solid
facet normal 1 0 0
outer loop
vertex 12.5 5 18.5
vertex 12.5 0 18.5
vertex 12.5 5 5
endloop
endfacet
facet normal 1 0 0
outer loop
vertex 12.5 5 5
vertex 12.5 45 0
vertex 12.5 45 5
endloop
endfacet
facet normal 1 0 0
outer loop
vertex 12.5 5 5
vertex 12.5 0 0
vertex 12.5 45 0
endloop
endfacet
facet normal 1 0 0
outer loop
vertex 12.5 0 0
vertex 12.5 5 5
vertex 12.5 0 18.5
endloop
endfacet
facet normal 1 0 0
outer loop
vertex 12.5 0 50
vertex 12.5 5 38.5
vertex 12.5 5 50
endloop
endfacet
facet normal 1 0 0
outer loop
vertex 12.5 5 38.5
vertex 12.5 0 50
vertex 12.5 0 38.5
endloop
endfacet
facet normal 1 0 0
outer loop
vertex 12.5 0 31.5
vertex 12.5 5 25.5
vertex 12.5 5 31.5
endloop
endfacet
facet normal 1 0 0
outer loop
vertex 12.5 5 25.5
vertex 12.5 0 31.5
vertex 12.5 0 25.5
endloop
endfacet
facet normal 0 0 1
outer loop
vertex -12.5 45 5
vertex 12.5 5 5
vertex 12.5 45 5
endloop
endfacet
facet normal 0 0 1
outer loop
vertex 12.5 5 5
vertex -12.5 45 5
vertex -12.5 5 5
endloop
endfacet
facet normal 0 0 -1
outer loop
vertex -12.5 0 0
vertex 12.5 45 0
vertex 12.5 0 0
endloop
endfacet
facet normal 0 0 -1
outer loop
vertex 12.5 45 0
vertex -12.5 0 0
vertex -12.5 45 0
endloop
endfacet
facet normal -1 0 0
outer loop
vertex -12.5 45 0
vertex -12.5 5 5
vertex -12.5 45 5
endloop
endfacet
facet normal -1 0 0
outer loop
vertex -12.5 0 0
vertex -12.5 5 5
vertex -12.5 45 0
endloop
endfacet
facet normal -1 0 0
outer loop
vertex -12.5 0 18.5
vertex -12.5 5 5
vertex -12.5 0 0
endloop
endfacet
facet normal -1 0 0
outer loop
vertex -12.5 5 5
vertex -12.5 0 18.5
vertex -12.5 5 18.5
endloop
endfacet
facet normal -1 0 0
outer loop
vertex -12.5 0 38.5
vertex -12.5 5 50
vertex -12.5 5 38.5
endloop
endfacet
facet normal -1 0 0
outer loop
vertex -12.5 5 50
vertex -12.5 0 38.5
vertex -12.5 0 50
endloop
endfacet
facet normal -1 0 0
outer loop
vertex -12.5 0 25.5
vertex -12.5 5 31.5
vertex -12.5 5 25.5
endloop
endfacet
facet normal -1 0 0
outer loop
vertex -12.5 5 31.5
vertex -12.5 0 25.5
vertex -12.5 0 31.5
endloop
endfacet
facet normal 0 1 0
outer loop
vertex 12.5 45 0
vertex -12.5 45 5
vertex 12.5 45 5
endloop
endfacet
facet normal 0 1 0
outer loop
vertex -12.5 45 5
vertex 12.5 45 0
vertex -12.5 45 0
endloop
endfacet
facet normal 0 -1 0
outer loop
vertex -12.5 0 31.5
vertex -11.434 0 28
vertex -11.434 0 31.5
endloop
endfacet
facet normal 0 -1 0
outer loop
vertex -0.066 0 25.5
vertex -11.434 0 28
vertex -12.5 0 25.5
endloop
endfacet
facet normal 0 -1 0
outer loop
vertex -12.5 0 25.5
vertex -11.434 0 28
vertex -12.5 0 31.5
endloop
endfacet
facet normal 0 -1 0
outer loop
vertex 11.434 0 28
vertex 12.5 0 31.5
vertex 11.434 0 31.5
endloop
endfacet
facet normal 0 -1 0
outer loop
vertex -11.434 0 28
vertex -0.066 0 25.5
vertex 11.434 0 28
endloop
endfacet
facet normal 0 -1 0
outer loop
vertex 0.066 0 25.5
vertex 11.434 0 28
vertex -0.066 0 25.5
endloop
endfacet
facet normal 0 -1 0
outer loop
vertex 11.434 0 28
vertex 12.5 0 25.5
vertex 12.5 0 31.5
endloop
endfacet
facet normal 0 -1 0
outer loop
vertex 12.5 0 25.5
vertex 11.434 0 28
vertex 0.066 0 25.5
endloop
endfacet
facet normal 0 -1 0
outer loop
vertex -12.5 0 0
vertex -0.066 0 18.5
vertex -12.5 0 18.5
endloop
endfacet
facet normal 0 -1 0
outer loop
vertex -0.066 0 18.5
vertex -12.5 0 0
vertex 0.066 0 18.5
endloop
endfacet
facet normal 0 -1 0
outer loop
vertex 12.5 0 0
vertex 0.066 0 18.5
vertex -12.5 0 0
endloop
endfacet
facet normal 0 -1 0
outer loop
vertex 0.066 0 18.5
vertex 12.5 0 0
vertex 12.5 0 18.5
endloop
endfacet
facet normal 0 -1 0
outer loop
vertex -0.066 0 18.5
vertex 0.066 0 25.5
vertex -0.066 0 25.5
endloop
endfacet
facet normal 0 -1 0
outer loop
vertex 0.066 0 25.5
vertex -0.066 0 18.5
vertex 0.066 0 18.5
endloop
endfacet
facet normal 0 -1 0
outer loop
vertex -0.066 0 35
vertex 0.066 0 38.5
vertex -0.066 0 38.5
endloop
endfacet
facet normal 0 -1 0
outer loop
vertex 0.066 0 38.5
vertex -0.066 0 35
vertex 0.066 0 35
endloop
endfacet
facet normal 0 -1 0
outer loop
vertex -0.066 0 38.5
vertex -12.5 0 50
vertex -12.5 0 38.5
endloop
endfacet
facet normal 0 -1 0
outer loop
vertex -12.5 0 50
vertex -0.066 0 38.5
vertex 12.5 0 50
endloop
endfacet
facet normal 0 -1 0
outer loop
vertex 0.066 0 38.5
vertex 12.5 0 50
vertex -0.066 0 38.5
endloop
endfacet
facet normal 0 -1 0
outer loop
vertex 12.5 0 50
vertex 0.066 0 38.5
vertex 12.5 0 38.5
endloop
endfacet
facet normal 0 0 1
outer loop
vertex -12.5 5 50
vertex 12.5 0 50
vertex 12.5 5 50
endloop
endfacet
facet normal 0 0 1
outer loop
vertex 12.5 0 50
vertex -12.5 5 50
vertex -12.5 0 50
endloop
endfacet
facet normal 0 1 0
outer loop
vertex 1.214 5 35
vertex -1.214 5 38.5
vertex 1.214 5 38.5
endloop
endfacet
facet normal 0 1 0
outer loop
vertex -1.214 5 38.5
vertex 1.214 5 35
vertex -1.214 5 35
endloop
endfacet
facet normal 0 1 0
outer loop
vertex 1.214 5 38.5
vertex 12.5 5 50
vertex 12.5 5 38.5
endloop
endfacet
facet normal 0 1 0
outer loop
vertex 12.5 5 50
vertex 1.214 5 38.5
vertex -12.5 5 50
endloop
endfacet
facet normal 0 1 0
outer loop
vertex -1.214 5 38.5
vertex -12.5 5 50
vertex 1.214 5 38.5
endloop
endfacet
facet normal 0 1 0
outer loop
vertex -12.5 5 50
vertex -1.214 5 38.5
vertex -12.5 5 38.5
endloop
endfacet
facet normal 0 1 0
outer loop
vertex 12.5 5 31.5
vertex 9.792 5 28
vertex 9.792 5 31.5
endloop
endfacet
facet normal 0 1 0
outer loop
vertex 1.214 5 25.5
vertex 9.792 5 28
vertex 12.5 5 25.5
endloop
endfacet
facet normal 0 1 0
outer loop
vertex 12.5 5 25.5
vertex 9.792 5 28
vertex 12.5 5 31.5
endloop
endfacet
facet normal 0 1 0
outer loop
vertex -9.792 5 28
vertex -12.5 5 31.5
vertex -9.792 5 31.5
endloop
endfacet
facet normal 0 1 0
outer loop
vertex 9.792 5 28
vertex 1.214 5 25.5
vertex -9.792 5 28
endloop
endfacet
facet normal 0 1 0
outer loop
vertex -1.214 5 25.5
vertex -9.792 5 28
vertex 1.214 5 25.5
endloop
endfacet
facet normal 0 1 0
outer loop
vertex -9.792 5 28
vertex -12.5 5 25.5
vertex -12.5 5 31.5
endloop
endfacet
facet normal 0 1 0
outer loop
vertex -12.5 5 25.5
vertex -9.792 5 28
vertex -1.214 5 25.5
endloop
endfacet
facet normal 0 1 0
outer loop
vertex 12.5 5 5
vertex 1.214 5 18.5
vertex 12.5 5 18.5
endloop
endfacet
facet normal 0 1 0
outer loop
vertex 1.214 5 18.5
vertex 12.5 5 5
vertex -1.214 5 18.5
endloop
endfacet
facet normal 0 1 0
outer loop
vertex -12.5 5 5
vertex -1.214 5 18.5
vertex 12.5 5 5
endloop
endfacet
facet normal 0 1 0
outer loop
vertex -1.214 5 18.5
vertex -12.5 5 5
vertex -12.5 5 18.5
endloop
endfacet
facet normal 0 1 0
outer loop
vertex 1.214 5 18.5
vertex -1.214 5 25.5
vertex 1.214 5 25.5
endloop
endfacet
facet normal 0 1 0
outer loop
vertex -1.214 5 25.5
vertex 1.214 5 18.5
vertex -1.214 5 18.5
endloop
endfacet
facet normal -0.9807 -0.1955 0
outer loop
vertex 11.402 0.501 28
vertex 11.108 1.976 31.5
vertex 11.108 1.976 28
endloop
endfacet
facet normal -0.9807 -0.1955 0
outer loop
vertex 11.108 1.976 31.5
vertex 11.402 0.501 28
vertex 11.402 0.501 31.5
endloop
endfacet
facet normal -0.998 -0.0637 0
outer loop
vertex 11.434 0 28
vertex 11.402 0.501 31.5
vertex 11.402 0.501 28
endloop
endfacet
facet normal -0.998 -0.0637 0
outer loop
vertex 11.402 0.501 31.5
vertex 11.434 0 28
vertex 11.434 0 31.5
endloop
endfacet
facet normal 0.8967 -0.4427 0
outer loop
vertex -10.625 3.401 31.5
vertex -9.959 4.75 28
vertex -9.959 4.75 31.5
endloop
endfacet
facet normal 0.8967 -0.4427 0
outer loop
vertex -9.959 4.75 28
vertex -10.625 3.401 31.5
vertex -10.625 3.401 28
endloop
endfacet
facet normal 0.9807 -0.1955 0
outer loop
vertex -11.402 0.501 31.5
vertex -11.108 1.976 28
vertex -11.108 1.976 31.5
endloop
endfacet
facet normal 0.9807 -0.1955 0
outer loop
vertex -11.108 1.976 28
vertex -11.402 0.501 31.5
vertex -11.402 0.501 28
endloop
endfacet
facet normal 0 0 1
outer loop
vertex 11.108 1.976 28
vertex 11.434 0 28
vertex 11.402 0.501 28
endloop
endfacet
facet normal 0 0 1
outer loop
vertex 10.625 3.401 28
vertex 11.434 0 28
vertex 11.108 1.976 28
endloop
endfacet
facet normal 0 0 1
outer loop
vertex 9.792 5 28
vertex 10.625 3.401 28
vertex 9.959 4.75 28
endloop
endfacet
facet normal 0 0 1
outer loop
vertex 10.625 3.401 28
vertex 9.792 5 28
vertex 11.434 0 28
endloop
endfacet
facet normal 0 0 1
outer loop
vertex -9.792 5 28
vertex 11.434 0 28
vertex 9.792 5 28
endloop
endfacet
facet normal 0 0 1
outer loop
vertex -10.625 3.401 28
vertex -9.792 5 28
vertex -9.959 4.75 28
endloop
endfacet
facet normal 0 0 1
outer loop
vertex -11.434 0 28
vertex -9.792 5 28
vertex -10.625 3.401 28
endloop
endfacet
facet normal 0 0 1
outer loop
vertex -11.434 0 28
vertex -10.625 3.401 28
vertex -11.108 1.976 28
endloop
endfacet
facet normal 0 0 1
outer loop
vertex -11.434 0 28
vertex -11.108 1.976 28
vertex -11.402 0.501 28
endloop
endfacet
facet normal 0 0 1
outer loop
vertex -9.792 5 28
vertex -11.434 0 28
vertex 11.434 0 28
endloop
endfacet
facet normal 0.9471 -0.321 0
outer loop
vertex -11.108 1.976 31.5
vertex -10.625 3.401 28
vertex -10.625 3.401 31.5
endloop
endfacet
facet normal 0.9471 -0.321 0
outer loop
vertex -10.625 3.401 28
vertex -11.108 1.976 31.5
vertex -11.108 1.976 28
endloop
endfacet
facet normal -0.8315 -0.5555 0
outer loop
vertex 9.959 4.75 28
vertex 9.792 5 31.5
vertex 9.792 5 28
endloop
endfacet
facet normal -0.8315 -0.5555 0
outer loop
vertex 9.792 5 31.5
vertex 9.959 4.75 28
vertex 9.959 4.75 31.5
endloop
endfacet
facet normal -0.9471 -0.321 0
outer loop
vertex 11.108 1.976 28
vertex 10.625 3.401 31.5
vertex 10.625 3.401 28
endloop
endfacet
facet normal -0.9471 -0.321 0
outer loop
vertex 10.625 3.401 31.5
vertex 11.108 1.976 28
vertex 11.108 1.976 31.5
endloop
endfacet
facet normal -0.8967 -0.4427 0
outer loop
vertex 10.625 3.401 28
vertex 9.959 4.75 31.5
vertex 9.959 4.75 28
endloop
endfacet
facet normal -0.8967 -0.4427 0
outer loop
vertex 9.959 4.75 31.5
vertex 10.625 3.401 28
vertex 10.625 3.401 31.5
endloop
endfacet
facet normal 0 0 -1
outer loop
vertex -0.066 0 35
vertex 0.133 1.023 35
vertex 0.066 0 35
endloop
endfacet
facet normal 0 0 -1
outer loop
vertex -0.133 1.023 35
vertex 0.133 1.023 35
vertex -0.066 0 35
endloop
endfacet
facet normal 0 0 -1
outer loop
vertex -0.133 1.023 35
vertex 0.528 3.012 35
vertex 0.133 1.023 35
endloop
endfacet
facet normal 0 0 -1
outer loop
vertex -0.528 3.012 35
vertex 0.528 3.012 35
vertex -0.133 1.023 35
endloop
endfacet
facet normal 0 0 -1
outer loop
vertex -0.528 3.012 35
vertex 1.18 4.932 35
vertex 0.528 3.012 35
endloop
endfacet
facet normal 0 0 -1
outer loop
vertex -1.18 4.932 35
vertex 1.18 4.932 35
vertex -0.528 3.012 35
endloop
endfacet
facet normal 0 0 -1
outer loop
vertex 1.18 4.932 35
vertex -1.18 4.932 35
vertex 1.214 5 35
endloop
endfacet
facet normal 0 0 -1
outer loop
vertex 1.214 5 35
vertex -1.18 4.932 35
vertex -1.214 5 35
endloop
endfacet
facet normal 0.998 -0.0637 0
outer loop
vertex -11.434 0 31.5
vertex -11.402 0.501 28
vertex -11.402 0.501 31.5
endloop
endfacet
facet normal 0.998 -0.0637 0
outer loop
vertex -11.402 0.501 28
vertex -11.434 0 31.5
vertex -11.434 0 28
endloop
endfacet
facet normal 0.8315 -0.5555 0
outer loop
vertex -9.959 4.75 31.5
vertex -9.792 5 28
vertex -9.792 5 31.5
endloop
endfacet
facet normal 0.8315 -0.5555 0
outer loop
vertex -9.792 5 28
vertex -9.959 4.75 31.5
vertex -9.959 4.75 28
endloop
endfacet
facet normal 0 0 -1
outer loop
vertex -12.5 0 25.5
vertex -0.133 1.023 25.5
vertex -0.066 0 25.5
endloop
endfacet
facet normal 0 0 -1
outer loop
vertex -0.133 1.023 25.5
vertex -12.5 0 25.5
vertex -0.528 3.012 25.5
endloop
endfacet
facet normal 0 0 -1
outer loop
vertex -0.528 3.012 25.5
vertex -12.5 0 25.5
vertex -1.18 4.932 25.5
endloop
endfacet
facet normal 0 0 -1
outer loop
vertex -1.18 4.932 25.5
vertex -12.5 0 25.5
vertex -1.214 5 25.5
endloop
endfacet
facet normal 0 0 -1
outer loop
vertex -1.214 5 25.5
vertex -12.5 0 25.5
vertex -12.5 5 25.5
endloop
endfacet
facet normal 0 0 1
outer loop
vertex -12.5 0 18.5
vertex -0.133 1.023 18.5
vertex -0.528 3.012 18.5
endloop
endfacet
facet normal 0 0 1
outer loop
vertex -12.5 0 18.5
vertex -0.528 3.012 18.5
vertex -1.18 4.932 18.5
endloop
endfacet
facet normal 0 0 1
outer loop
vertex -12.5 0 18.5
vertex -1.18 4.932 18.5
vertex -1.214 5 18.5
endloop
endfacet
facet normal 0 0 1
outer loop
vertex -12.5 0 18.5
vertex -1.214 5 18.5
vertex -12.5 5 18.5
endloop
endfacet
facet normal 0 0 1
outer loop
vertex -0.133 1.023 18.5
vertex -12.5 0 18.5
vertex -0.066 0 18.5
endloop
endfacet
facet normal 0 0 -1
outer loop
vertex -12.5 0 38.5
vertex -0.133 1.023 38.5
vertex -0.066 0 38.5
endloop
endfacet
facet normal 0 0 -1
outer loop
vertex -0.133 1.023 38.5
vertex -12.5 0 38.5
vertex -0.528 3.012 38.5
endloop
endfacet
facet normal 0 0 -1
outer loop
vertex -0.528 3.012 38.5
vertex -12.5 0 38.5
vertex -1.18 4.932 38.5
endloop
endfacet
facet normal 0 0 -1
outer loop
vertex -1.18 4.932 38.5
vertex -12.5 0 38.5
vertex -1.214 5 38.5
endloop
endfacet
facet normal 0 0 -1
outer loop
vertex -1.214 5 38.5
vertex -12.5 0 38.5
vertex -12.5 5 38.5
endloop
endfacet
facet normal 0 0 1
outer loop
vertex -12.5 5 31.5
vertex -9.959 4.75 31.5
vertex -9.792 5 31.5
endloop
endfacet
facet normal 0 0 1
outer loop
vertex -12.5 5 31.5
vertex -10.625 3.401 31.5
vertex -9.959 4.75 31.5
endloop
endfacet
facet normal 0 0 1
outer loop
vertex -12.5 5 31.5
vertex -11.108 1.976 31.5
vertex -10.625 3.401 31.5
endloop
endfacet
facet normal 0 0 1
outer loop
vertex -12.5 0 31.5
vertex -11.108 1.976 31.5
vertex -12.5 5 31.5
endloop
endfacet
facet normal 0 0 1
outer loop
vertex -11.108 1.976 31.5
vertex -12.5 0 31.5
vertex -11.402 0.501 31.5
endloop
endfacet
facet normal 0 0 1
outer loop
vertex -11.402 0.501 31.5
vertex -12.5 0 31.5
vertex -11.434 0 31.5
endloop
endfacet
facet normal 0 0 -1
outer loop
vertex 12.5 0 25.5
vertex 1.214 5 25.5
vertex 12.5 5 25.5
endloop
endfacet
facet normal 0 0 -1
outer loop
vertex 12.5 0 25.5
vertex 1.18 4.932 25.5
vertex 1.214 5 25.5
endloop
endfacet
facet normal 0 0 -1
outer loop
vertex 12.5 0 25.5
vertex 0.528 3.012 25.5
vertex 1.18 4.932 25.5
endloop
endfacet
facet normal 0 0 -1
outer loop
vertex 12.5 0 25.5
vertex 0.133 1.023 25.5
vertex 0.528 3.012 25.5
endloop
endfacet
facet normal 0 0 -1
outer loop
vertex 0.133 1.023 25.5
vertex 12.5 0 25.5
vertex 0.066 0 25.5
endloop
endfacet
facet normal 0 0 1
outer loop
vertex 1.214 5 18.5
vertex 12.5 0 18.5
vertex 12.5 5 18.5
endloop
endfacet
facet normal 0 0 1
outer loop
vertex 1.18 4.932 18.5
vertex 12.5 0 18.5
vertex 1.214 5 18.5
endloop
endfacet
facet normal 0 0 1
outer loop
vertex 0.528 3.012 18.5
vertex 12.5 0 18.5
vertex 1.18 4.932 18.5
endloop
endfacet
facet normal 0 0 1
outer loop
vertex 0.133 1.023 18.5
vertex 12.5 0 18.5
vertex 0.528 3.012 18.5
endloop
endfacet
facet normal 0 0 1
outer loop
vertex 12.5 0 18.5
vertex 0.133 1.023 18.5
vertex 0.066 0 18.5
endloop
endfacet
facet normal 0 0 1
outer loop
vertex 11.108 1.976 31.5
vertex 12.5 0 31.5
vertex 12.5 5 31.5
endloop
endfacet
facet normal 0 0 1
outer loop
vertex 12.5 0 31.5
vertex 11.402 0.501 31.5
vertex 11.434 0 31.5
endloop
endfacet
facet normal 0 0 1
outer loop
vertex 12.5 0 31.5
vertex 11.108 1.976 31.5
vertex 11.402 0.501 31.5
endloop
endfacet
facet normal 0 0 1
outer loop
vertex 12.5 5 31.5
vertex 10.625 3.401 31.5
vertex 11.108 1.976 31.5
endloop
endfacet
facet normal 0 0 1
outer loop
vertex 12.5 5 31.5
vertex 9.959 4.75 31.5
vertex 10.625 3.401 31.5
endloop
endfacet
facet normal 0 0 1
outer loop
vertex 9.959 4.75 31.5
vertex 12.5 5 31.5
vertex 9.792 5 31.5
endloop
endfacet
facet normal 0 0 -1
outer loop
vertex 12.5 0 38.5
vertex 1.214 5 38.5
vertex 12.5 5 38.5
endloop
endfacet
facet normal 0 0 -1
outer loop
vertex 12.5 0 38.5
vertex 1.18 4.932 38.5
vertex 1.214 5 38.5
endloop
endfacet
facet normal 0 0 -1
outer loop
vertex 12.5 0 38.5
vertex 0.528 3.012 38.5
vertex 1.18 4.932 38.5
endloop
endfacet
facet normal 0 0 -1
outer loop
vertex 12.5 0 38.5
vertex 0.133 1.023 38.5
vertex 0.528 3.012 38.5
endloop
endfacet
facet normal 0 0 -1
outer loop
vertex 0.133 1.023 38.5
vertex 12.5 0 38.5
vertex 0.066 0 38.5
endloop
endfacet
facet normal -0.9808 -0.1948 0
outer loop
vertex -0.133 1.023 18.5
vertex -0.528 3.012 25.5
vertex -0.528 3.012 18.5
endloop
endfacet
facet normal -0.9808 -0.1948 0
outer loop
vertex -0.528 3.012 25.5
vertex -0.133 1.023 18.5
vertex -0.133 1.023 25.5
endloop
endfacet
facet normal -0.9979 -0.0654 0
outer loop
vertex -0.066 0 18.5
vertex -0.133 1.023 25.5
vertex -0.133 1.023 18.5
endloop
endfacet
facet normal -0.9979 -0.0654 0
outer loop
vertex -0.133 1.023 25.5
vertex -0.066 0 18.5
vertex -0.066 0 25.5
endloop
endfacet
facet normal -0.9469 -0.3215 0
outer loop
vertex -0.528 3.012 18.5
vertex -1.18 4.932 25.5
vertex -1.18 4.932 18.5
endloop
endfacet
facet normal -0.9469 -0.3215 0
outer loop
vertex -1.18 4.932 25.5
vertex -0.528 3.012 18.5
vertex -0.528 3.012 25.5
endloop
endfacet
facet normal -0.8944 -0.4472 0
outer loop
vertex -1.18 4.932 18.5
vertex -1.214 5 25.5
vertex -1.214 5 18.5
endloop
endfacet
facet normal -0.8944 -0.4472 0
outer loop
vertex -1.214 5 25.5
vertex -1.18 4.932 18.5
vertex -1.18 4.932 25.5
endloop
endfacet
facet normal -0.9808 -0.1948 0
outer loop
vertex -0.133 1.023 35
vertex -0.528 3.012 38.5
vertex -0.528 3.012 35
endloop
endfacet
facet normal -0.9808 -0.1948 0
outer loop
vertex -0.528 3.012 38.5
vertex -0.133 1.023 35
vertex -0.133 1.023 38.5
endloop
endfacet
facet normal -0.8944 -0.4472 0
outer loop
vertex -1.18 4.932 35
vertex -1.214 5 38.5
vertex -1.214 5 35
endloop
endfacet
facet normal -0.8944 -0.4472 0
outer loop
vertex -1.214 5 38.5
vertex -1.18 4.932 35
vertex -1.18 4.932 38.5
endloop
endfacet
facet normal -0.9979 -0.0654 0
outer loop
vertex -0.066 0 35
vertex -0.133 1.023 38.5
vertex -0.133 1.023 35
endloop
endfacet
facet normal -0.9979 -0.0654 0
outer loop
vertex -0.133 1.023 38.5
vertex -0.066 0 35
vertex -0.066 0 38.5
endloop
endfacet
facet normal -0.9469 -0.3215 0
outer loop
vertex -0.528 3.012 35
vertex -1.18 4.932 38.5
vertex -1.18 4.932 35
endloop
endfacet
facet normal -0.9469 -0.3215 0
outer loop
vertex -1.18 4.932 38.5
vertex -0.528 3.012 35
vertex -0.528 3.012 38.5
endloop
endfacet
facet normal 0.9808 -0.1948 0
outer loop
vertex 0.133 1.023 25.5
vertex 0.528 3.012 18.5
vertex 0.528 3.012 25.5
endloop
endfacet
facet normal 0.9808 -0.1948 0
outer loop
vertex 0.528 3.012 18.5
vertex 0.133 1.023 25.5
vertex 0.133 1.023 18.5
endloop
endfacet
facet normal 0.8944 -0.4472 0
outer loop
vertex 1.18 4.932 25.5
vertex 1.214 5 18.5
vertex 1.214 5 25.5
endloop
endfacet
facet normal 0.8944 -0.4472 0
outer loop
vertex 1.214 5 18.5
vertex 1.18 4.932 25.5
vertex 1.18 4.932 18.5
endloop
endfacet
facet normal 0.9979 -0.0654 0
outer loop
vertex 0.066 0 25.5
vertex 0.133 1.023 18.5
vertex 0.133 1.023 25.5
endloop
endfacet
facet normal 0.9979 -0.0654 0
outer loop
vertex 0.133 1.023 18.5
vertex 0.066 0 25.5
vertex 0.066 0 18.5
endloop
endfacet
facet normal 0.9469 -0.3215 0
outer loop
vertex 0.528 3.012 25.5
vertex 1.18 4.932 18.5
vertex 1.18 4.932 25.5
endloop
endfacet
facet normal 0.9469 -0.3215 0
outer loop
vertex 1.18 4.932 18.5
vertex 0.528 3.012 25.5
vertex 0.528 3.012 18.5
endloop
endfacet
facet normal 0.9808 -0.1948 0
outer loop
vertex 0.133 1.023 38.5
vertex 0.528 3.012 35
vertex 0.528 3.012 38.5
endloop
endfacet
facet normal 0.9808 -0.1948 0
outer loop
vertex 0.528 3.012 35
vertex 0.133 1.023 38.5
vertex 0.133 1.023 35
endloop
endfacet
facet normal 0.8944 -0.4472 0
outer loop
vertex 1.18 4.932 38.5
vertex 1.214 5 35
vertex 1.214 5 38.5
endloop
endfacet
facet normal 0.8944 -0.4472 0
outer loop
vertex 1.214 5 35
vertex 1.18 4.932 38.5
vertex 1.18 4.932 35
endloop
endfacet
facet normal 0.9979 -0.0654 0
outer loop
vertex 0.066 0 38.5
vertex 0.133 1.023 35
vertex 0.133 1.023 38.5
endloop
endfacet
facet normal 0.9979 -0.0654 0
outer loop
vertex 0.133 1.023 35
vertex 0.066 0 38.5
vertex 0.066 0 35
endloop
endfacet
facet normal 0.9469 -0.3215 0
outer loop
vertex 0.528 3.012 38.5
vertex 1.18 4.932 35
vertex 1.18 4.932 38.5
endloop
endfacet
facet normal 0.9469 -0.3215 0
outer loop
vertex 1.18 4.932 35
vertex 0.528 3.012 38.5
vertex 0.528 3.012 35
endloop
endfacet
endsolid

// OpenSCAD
// L-shaped mounting bracket for a NEMA 17 stepper motor (e.g. syringe pump).
// Base plate with two vertical through-holes; vertical motor plate with a
// motor-centring boss hole and a 3 mm screw pattern; two triangular gussets
// at the edges. NOVEL general part.
//

base_x   = 25;
base_y   = 45;
base_z   = 5;
screw_h  = 4.5;
motor_y  = 5;
motor_z  = 50;
boss_h   = 23;
screw_p  = 31;
gusset_t = 5;
gusset_l = 20;
gusset_w = 20;

$fn = 48;

base_holes = [
    [-17, 30],
    [17, 30]
];

motor_holes = [
    [0, 28],                 // boss hole
    [-15.5, 18.5], [-15.5, 31.5],
    [15.5, 18.5],  [15.5, 31.5]
];

difference() {
    union() {
        translate([-base_x / 2, 0, 0]) cube([base_x, base_y, base_z]);
        translate([-base_x / 2, 0, 0]) cube([base_x, motor_y, motor_z]);
        for (x = [-base_x / 2, base_x / 2])
            translate([x, 0, 0])
                linear_extrude(motor_y)
                    polygon([[-gusset_l, gusset_l], [-gusset_l, gusset_w], [gusset_l, gusset_w]]);
    }
    for (p = base_holes)
        translate(p) cylinder(h = base_z + 1, d = screw_h);
    for (p = motor_holes)
        translate([p[0], -1, p[1]]) cylinder(h = motor_y + 2, d = boss_h);
    for (p = motor_holes)
        if (p != [0, 28])
            translate([p[0], -1, p[1]]) cylinder(h = motor_y + 2, d = screw_p);
}
